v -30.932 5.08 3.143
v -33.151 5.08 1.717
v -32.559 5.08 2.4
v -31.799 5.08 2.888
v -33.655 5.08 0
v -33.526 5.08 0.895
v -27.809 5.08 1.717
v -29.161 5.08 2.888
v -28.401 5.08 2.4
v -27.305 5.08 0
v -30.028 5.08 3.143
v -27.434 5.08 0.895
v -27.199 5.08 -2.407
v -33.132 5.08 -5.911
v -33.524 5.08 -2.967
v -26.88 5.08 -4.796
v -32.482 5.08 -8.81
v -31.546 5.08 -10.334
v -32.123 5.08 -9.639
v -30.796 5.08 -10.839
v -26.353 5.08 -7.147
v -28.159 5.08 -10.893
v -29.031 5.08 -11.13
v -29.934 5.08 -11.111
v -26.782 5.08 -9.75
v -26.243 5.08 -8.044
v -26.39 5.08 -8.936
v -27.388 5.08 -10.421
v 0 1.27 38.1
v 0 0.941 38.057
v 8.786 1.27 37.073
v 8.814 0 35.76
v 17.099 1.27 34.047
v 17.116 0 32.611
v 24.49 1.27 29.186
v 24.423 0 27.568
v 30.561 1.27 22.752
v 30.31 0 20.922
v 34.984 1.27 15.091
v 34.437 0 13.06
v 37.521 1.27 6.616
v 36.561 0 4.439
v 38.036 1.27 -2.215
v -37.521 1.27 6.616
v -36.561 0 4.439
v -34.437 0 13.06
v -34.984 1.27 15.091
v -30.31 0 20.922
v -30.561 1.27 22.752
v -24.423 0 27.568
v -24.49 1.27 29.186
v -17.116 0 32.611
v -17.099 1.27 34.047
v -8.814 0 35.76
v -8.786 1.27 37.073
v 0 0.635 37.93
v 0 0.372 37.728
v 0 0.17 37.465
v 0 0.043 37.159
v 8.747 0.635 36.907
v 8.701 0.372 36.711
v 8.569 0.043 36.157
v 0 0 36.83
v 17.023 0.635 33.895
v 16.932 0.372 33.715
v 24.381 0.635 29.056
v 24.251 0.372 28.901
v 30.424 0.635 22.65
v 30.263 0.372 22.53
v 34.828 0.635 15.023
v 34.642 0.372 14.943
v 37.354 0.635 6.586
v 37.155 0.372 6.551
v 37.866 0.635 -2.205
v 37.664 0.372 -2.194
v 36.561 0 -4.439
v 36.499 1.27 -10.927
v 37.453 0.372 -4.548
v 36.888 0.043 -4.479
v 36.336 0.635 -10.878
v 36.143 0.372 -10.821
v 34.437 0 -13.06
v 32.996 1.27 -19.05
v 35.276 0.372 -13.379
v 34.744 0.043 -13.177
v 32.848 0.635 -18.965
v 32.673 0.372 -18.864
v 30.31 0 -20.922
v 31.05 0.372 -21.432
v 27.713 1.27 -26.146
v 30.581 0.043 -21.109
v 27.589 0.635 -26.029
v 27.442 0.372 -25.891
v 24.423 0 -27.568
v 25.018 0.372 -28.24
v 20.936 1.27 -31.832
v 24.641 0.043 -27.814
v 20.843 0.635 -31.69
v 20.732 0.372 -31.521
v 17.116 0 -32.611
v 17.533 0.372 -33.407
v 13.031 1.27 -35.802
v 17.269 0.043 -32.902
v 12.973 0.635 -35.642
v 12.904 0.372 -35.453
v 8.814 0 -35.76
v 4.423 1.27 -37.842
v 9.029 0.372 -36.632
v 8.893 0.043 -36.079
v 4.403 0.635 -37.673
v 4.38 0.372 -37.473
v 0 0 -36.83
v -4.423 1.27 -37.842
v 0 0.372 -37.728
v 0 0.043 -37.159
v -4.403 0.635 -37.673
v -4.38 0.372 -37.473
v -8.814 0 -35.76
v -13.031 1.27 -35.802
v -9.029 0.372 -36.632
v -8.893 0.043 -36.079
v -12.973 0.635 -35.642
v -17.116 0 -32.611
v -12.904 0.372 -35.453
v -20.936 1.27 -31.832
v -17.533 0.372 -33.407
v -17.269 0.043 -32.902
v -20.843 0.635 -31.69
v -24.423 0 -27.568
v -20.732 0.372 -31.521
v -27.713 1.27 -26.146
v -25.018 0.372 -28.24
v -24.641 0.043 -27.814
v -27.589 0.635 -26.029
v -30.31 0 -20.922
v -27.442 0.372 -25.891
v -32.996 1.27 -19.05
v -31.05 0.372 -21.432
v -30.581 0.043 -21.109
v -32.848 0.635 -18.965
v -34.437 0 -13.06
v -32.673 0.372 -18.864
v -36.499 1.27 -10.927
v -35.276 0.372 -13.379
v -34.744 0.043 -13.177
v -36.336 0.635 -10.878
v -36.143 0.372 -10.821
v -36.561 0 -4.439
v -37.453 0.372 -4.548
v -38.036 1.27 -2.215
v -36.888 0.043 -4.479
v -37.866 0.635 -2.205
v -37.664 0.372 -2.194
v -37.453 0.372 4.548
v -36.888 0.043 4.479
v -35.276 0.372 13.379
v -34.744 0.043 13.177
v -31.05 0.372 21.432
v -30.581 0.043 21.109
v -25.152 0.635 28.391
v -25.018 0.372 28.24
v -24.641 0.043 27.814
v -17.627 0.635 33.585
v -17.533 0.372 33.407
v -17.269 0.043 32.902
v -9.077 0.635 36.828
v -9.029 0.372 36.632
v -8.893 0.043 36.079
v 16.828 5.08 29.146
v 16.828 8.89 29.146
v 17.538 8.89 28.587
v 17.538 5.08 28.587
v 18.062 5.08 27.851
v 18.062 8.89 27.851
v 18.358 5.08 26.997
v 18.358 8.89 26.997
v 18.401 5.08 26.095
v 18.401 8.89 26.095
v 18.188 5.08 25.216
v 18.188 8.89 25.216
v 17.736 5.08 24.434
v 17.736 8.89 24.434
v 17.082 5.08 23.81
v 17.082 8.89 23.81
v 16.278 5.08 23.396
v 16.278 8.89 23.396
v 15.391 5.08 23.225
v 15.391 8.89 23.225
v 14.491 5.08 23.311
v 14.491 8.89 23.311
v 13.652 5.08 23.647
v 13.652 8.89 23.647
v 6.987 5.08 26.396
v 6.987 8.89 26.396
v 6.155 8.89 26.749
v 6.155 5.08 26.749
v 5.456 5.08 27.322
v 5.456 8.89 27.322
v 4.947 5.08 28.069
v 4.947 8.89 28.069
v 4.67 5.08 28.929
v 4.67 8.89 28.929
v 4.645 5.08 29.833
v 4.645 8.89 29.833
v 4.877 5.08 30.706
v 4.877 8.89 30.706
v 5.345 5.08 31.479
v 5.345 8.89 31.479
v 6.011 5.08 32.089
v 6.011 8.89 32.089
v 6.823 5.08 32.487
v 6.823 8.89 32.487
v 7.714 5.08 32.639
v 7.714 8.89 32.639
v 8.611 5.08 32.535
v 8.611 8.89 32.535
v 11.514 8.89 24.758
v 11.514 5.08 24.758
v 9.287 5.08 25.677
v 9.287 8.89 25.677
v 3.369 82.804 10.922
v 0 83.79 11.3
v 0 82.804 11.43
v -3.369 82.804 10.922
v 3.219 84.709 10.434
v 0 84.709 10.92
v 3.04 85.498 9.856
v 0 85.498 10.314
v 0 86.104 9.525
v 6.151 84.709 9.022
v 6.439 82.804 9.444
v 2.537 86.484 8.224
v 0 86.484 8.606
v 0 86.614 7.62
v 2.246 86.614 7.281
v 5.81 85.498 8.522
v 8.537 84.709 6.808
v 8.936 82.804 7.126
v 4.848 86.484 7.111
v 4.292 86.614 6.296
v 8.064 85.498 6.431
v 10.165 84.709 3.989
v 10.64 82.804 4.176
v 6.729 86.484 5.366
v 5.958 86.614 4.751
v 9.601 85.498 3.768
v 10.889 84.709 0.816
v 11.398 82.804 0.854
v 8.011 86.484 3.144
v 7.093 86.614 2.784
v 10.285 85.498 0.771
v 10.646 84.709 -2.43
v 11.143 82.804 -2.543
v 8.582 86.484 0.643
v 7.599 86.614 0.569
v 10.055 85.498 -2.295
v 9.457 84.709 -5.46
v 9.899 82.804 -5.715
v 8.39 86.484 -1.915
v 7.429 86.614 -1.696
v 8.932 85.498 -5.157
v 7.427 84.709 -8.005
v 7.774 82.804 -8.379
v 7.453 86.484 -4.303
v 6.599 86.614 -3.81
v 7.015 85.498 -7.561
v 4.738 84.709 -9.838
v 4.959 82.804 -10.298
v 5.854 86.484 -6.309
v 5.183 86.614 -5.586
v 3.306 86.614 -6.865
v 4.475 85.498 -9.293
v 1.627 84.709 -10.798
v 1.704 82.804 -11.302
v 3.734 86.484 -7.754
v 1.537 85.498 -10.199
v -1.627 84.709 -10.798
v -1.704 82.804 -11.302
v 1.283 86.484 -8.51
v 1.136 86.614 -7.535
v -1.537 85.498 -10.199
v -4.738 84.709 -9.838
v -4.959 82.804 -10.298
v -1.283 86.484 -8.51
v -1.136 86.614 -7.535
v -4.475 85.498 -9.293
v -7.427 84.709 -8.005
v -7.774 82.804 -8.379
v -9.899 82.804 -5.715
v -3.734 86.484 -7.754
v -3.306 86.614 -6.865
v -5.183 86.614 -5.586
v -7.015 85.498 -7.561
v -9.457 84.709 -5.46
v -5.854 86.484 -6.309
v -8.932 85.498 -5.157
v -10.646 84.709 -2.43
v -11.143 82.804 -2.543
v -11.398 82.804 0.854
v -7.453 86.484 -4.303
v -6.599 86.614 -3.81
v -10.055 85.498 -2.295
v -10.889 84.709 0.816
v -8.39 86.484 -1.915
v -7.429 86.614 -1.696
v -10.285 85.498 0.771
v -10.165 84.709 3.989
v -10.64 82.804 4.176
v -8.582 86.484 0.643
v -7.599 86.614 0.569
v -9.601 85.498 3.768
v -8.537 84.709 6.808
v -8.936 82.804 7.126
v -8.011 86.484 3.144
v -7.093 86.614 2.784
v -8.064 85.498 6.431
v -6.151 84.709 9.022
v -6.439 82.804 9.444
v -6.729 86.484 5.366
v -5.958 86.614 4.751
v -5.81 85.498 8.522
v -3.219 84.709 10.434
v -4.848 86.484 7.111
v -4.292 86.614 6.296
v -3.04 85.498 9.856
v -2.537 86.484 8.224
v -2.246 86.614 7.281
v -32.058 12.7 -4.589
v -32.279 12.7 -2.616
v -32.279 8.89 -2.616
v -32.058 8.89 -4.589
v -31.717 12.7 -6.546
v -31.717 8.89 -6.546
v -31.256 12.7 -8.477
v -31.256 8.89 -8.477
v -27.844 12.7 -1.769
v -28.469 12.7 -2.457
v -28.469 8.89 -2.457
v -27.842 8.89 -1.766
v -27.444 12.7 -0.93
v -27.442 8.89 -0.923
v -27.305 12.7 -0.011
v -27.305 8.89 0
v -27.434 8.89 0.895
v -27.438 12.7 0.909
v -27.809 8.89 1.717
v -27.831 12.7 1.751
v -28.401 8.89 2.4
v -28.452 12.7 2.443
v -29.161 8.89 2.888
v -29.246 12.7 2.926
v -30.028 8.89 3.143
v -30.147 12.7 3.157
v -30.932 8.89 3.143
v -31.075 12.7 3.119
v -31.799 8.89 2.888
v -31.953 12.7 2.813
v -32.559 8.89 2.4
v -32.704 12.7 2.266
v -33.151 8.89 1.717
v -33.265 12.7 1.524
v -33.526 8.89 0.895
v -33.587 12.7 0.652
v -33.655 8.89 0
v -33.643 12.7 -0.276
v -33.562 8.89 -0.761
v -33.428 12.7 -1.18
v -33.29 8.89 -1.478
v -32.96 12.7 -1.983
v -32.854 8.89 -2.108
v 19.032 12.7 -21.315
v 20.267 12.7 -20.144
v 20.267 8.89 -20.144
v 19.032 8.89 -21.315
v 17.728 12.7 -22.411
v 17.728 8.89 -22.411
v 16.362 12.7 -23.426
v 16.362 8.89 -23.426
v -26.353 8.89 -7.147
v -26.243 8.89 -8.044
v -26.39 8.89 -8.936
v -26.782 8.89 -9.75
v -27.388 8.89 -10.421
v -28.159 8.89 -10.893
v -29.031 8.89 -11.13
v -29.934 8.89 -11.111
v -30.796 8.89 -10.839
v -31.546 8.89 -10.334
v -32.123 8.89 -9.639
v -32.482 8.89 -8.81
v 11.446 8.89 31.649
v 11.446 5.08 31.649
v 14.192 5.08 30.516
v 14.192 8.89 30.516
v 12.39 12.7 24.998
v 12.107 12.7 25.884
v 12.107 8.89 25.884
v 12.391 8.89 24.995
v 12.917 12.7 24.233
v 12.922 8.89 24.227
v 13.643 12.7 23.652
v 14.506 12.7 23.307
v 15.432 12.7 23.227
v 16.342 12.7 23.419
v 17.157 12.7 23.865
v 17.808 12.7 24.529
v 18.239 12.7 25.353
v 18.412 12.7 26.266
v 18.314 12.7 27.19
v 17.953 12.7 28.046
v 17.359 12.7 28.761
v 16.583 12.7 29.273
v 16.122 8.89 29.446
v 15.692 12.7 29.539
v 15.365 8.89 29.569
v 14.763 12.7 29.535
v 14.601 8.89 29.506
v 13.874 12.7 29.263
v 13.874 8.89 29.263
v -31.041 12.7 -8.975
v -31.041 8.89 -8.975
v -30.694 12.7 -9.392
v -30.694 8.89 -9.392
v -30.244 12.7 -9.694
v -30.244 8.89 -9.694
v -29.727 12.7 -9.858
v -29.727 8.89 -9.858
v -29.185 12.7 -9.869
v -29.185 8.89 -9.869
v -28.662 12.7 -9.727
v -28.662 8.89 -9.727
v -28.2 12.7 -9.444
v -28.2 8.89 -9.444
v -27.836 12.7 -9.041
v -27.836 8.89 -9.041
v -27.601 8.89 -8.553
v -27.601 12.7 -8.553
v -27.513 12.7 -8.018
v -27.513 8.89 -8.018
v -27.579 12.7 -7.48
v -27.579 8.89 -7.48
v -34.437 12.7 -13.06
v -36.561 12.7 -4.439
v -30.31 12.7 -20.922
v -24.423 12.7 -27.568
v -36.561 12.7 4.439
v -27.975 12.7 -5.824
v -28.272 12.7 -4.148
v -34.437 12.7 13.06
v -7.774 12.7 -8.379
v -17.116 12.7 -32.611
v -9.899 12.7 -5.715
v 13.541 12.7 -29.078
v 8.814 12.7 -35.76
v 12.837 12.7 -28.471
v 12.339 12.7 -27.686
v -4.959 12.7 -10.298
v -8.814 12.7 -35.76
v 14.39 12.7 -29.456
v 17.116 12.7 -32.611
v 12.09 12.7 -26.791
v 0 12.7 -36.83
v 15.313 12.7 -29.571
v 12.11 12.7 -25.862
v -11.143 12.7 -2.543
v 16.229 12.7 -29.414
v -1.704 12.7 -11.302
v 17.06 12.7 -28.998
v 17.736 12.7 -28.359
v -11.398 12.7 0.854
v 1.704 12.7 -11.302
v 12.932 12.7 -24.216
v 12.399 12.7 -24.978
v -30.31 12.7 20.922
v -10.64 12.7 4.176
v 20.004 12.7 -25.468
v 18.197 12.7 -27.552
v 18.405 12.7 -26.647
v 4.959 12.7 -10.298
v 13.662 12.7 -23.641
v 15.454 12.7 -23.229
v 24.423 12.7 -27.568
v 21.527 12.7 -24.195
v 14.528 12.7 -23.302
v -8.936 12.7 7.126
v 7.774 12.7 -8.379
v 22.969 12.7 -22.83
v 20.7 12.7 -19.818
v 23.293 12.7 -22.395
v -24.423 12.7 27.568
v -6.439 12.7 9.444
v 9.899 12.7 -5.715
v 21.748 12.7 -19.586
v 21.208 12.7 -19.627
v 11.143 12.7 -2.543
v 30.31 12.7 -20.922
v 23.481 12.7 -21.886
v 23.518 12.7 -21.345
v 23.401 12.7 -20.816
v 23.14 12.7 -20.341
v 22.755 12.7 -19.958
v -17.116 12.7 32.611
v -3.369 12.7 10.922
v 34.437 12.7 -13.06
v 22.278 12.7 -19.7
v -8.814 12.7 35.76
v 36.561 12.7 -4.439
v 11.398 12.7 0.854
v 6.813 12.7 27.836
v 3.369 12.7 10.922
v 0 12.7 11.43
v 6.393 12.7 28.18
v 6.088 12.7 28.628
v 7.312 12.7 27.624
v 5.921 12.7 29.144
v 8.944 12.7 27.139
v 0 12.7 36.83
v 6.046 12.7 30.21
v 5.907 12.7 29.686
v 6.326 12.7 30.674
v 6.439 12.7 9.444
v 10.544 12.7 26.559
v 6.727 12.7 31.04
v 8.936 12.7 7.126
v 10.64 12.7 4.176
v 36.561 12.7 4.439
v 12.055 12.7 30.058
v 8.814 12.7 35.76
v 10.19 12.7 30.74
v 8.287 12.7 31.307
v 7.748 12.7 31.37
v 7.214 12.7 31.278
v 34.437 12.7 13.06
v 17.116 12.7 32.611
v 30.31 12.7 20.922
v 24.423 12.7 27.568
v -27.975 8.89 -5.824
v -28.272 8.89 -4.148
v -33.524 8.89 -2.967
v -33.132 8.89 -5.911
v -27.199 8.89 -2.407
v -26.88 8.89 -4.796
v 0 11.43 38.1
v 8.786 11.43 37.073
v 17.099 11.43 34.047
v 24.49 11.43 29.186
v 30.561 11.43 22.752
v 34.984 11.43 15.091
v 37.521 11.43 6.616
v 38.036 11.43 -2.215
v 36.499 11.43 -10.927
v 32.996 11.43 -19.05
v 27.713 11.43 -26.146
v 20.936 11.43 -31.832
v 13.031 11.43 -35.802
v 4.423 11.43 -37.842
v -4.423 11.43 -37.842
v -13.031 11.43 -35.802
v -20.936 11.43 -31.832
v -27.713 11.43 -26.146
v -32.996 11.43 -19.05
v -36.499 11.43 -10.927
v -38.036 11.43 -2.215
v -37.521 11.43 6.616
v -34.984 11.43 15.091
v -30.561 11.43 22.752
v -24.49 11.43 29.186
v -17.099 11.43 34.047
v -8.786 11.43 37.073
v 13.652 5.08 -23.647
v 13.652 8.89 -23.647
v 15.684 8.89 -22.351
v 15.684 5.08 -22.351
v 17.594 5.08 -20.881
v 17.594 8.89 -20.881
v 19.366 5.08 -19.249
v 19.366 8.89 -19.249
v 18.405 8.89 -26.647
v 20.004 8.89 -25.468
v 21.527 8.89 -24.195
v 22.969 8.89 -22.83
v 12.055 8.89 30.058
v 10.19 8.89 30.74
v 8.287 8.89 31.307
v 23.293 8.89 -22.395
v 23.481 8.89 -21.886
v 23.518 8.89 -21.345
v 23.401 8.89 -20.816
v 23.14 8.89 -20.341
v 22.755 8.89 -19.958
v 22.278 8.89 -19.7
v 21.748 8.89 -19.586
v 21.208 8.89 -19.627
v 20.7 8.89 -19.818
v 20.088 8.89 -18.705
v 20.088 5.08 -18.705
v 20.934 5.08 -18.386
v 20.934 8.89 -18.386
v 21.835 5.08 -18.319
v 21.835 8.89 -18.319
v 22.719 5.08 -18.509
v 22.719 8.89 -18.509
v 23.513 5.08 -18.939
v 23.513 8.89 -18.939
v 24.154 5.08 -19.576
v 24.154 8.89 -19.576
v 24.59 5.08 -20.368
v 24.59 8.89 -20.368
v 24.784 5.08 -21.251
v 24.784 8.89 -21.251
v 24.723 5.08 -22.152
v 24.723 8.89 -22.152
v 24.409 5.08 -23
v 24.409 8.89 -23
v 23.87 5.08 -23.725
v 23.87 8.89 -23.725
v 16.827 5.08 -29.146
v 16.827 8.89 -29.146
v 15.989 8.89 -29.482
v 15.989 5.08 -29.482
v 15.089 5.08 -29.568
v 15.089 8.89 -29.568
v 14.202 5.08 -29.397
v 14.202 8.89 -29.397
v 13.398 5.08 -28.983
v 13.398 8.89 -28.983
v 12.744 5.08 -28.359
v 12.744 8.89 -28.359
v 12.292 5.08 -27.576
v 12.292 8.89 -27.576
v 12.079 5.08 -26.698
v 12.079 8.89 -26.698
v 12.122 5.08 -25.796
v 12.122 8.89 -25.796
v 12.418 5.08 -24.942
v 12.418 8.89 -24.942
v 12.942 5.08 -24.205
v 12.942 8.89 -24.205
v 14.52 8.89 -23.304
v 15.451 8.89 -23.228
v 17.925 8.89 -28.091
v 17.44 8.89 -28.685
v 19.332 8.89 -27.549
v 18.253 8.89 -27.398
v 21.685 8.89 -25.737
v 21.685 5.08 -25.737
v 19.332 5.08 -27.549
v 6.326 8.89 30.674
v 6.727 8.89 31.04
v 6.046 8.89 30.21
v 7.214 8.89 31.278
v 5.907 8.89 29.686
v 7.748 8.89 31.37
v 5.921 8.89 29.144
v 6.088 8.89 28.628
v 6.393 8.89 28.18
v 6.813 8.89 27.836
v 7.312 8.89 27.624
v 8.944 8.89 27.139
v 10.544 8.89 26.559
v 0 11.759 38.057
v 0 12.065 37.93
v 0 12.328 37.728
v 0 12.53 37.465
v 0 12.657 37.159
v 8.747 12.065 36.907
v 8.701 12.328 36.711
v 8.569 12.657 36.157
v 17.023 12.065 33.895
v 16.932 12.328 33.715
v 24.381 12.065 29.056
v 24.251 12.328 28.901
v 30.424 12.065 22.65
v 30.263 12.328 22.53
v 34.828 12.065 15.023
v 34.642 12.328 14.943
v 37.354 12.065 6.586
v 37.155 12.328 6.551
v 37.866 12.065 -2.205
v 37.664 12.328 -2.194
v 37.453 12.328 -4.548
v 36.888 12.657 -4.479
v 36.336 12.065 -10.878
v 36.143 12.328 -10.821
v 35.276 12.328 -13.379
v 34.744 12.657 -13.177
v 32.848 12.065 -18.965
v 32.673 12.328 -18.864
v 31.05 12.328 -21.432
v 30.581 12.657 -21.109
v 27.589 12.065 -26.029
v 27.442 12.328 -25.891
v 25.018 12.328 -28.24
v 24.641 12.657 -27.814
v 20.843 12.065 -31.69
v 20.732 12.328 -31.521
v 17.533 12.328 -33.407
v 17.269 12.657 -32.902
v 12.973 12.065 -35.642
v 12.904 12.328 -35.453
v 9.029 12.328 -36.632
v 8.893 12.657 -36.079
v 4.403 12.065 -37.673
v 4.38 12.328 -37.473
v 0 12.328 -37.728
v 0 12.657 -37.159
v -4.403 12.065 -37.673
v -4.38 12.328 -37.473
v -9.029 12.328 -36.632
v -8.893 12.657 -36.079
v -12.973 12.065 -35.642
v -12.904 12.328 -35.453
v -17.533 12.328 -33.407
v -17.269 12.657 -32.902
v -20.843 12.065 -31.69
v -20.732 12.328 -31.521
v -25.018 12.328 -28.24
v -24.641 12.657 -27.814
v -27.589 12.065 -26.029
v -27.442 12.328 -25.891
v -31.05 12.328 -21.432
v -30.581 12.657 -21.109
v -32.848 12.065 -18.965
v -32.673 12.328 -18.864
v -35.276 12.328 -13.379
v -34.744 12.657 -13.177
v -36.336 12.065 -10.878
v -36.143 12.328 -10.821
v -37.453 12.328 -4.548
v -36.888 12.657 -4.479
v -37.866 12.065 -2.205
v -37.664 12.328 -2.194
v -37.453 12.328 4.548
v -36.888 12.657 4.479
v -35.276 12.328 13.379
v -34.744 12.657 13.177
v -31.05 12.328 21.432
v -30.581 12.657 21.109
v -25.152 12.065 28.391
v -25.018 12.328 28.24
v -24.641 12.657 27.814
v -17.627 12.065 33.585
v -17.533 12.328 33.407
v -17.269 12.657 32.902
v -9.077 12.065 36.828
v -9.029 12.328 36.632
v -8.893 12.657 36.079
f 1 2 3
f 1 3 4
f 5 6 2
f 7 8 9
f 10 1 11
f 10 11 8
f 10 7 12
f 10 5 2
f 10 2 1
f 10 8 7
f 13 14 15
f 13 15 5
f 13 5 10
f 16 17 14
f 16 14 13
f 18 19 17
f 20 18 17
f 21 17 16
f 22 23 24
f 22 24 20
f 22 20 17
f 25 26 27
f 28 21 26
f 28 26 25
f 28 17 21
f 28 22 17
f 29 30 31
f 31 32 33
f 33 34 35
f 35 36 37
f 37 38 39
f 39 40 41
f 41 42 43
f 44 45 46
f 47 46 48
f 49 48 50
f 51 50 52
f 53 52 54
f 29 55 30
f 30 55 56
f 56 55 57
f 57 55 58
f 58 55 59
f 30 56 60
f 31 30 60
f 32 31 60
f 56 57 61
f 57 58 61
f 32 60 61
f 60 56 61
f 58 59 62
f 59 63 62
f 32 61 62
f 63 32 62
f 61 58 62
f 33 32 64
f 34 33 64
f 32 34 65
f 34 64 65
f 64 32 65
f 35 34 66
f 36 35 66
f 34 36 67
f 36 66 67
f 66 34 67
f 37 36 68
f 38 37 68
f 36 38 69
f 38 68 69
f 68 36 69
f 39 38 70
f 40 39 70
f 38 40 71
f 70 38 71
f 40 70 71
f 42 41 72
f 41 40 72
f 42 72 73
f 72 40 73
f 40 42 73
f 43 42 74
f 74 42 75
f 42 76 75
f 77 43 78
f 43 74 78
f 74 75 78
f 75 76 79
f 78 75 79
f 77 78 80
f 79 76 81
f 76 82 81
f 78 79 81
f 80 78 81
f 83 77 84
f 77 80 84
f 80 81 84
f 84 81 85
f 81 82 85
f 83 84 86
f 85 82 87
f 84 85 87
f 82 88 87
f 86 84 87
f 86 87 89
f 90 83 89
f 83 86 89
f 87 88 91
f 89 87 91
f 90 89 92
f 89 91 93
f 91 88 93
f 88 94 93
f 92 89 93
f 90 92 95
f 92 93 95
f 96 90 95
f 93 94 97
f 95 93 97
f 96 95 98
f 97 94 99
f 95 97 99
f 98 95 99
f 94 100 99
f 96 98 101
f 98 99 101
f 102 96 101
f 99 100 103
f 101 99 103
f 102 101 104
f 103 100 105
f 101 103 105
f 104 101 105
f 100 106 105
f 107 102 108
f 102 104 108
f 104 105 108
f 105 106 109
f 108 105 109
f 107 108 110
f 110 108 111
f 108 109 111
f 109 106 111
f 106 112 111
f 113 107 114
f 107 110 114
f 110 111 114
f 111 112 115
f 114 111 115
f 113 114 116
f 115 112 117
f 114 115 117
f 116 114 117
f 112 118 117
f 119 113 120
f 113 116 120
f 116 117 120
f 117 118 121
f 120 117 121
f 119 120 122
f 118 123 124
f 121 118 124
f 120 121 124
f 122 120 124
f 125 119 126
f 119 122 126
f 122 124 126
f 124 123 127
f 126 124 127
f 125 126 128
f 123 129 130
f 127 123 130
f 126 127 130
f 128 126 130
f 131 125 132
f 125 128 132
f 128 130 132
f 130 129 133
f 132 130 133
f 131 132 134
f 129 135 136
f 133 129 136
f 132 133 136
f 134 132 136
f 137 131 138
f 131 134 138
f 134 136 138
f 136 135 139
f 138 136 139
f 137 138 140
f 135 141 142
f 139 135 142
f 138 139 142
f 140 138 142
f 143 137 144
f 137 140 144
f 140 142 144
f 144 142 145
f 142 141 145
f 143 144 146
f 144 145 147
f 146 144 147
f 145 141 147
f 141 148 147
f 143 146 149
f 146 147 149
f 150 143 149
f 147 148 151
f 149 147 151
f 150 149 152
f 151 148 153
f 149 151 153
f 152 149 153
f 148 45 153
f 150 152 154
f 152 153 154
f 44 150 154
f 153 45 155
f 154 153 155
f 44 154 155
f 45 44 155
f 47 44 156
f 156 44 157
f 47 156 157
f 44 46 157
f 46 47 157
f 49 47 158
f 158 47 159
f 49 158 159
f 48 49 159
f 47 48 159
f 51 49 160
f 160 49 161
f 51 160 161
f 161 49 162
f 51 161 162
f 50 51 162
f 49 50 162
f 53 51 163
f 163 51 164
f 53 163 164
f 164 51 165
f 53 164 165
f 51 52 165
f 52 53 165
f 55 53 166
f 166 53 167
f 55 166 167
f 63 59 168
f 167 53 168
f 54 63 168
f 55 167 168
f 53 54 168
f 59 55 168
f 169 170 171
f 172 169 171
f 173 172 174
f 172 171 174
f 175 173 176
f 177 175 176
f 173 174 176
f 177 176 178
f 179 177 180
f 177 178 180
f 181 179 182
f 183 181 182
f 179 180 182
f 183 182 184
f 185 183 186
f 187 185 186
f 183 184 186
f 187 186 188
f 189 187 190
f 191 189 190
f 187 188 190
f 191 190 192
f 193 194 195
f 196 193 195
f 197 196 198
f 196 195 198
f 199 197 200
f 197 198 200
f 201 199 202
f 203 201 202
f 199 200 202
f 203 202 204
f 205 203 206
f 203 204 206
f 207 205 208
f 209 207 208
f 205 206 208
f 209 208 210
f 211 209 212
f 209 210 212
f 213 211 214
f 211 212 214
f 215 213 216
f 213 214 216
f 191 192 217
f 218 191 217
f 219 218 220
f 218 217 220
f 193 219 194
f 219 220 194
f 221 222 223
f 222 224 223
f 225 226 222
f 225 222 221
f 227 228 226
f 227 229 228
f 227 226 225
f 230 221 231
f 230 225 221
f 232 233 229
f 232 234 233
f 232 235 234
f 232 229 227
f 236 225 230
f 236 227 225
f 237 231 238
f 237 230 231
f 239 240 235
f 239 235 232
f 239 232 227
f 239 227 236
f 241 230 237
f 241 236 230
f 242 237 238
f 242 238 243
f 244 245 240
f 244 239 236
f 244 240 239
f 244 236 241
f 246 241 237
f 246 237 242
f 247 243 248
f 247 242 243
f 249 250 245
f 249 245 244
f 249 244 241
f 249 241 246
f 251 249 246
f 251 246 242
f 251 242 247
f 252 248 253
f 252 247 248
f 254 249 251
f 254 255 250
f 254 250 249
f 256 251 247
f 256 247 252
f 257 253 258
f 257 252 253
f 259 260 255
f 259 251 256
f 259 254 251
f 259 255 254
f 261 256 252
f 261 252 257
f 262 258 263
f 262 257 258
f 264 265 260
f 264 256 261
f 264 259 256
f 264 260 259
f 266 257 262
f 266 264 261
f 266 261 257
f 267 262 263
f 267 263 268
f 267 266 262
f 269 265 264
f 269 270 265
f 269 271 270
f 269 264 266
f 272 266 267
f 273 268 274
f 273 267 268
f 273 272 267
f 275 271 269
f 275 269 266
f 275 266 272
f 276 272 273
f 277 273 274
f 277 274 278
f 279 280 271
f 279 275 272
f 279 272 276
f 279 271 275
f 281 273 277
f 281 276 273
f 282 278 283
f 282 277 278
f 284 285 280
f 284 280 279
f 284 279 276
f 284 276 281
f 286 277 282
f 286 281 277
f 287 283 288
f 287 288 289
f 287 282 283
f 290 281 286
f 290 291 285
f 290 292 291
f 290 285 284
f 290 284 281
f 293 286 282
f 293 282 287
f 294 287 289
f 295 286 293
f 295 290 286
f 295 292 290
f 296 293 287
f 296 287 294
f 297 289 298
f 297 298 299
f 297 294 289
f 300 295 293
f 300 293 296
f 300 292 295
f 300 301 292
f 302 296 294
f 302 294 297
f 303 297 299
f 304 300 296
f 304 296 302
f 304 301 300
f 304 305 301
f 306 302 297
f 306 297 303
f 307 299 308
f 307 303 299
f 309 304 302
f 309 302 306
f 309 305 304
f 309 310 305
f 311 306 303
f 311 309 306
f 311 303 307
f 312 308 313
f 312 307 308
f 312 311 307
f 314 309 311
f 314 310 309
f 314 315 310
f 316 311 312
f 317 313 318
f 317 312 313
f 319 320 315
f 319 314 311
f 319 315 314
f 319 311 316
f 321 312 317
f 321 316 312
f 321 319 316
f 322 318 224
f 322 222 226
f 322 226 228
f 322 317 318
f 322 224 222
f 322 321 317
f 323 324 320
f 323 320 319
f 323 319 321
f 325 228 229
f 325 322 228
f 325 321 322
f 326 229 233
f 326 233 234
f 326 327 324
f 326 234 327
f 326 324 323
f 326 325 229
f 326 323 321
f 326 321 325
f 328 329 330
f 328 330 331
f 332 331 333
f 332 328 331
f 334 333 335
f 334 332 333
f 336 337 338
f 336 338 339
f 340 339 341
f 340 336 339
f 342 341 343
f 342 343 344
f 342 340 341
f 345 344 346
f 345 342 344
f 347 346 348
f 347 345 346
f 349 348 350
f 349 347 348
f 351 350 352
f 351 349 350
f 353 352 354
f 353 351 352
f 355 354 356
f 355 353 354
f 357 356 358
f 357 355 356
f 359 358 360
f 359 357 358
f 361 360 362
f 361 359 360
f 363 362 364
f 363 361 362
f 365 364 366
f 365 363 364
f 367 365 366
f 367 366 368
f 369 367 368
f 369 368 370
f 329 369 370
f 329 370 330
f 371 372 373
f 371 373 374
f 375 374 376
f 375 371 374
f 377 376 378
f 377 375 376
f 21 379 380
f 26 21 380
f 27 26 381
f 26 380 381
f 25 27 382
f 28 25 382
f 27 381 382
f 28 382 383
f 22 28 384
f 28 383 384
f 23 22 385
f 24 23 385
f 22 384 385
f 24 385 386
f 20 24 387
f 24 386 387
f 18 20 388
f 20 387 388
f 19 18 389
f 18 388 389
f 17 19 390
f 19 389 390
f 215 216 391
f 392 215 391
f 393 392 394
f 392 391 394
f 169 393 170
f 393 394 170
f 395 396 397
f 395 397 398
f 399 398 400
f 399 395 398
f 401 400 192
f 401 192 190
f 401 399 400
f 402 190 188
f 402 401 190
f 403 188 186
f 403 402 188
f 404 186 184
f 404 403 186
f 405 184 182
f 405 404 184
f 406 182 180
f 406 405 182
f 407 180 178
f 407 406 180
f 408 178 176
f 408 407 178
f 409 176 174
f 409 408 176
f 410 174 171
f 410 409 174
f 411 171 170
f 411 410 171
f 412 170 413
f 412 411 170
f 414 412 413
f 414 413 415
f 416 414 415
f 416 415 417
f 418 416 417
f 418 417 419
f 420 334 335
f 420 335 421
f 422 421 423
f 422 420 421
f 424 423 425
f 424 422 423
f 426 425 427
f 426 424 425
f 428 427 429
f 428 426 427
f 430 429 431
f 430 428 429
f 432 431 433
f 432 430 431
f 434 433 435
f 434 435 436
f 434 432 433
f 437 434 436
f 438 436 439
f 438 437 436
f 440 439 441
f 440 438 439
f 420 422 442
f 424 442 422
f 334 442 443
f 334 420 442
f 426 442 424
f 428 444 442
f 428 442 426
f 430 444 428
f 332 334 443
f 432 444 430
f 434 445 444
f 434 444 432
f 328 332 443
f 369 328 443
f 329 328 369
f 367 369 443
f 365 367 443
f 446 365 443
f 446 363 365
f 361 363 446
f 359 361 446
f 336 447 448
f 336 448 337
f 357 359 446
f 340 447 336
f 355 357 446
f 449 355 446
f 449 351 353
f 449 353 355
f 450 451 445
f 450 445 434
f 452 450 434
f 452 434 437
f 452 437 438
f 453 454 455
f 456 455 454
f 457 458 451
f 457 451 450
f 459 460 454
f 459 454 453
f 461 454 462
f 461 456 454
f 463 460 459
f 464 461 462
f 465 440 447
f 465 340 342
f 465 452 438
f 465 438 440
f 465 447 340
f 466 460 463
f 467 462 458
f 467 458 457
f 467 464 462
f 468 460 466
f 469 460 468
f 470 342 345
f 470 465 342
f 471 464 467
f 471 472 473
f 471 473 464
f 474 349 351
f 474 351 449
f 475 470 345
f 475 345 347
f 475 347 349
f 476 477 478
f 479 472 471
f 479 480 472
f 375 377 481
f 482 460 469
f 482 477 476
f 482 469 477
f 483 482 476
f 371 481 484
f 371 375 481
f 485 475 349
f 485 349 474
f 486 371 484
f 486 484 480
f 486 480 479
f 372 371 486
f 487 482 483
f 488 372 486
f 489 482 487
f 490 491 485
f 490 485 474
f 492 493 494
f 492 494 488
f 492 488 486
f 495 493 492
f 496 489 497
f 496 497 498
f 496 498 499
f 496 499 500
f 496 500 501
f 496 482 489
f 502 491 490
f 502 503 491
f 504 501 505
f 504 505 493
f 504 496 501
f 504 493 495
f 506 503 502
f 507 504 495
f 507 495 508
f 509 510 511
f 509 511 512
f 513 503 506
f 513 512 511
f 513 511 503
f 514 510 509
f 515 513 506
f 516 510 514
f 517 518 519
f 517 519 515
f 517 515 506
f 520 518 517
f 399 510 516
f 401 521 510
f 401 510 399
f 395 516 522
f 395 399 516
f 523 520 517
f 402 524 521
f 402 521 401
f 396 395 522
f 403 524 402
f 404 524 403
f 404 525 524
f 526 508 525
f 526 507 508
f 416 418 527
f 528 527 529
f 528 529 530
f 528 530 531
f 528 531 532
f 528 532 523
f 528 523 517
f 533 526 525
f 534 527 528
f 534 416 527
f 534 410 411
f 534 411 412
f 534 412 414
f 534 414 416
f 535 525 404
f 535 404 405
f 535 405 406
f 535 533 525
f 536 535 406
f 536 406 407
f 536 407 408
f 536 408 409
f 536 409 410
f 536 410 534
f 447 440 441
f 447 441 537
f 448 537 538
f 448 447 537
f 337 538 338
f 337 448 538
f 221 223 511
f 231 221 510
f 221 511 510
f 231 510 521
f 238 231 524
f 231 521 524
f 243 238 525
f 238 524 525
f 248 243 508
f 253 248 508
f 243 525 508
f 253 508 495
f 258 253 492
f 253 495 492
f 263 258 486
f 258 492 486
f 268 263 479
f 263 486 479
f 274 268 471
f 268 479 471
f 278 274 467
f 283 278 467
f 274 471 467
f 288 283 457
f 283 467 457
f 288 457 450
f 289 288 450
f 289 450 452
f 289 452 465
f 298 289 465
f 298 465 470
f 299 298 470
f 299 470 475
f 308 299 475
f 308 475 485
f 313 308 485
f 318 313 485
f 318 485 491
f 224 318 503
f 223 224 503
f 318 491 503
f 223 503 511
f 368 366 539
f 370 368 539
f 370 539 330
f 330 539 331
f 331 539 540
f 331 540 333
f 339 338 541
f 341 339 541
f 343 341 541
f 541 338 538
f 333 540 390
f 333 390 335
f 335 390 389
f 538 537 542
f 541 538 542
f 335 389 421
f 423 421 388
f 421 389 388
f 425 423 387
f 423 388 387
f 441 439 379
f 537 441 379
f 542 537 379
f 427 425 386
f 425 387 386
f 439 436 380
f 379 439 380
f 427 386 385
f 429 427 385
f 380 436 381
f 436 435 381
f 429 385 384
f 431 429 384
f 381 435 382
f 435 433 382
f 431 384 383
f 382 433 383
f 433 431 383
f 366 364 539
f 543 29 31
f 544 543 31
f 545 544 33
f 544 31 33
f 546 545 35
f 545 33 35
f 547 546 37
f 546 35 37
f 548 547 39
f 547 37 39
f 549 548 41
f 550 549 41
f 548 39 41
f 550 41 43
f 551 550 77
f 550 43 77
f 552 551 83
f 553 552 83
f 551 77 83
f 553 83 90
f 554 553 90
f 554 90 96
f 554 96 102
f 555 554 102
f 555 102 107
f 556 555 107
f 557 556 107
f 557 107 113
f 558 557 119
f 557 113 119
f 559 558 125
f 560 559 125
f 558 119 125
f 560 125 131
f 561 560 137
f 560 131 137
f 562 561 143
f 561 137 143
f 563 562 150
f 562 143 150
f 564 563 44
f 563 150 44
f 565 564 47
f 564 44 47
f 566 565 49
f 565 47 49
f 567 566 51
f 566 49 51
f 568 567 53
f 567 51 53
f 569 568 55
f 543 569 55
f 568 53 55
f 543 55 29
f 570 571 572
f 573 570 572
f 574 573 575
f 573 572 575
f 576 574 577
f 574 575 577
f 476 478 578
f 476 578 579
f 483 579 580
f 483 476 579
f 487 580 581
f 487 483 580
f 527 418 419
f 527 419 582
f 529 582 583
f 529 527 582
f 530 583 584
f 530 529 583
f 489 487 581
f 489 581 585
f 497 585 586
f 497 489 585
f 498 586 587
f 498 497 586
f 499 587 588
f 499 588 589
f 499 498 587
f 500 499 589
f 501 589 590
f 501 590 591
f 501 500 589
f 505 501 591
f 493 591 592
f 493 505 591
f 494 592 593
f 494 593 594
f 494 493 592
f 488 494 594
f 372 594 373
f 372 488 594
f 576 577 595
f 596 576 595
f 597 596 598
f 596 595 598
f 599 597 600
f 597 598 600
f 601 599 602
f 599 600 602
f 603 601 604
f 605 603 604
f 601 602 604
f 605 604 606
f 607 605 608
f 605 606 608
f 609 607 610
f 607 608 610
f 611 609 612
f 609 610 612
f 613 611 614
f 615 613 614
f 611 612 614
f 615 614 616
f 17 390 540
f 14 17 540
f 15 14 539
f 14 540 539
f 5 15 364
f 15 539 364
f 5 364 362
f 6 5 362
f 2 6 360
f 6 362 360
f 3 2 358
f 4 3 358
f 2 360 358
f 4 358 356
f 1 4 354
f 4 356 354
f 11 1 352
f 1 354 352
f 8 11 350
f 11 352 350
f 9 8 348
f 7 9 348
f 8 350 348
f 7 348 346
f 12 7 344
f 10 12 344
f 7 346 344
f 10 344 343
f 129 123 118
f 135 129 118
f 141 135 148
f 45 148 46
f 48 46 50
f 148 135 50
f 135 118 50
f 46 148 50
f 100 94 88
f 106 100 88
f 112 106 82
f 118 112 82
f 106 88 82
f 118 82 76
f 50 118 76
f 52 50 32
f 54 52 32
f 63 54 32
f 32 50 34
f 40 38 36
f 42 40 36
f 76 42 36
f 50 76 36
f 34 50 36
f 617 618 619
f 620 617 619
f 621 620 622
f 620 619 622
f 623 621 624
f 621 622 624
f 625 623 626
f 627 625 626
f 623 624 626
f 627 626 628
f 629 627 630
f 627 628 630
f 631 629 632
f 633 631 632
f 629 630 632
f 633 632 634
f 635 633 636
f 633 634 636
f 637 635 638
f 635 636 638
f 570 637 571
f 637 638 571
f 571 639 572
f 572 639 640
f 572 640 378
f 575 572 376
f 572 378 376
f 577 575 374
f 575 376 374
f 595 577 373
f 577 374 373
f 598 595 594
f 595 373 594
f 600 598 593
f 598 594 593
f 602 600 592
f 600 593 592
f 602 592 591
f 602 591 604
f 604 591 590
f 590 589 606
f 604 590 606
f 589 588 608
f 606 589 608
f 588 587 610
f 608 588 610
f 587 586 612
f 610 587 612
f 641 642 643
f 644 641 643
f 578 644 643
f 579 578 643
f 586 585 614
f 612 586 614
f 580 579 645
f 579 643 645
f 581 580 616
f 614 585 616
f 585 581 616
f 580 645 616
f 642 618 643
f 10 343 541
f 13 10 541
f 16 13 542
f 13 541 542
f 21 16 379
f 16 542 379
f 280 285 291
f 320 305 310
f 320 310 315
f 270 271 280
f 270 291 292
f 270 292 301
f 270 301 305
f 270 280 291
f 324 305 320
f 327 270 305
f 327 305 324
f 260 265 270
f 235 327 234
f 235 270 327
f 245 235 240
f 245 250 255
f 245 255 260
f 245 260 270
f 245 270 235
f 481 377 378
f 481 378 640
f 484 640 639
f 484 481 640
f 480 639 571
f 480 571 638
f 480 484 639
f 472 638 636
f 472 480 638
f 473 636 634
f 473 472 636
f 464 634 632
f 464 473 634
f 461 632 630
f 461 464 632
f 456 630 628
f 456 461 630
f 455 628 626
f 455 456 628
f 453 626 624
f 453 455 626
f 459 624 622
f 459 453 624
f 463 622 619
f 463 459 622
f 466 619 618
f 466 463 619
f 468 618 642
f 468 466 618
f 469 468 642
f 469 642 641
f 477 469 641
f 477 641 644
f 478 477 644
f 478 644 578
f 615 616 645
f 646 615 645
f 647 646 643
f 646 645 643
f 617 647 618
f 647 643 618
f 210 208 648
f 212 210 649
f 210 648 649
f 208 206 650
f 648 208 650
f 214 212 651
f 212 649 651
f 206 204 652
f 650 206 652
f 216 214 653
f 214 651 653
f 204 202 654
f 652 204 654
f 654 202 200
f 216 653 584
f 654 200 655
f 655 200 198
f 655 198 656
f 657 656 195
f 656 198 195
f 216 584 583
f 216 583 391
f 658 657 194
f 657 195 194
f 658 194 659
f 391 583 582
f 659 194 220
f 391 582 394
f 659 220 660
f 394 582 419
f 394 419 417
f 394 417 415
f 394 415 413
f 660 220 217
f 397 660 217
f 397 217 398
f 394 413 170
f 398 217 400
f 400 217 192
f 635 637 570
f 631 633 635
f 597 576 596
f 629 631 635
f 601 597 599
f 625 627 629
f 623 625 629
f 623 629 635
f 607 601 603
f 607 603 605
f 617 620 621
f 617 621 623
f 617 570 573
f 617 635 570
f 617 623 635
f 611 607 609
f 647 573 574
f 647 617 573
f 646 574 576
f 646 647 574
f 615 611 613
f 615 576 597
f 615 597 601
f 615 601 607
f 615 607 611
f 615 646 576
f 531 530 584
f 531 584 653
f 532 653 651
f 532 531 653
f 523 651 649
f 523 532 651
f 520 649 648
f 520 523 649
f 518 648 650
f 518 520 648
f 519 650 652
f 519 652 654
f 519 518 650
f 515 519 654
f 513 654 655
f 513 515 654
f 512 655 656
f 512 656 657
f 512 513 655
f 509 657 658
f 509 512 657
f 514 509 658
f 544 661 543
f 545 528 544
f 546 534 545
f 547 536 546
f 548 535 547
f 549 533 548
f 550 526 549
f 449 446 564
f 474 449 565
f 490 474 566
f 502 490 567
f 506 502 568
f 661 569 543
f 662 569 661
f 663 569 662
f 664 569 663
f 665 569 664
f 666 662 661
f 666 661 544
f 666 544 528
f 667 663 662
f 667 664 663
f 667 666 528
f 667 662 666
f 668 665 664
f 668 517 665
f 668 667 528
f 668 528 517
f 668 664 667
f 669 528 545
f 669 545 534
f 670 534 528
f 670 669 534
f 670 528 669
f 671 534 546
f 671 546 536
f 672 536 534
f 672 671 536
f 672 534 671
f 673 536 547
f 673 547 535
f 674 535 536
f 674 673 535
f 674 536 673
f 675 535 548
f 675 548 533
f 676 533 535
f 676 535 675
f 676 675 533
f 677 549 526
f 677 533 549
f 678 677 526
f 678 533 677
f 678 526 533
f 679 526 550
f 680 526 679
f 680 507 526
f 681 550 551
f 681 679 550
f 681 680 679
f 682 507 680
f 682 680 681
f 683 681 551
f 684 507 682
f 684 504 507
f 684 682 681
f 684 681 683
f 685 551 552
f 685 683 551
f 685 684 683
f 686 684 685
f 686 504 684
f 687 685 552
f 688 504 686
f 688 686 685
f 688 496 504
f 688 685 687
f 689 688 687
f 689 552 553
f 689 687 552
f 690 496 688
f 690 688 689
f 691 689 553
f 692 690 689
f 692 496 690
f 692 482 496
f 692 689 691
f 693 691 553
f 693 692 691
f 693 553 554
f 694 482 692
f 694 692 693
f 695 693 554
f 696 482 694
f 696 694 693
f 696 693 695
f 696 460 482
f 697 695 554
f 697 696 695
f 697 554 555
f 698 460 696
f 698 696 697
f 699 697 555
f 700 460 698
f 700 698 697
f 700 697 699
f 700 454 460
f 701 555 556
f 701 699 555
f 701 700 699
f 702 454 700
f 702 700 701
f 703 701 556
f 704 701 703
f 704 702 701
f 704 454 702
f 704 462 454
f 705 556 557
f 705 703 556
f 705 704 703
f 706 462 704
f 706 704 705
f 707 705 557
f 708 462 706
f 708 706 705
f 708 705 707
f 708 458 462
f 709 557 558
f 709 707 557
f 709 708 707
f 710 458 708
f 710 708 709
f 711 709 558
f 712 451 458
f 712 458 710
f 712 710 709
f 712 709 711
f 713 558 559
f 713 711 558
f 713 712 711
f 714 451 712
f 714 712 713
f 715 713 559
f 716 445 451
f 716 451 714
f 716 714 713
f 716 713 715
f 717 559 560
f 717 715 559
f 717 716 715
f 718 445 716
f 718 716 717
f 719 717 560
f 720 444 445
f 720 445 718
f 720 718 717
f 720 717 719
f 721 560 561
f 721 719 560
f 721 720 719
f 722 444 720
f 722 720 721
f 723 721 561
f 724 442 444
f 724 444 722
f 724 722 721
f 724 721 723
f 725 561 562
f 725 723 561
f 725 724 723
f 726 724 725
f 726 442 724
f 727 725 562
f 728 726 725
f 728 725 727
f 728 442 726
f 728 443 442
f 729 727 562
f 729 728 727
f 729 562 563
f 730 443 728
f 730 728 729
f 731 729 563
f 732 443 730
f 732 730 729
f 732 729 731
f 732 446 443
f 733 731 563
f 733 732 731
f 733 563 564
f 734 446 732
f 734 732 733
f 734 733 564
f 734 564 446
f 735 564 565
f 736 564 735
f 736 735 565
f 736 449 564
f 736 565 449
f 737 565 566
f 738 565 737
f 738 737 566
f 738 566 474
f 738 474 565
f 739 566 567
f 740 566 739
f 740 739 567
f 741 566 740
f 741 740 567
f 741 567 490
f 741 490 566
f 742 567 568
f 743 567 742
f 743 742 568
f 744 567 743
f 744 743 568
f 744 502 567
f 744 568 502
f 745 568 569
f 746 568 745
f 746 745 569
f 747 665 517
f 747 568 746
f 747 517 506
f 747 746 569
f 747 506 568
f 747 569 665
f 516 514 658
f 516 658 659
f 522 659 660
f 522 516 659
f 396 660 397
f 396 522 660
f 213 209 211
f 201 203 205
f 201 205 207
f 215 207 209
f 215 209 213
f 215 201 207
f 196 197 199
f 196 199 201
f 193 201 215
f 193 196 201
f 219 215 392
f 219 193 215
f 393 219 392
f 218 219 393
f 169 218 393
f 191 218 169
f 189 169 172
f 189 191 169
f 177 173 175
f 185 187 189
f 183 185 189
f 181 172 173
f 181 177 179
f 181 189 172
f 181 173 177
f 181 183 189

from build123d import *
from build123d.topology import SkipClean

# Parameters (mm, degrees)
SKETCH1_R           = 38.1
BOSS_EXTRUDE1_DEPTH = 12.7
SKETCH2_R           = 11.43
BOSS_EXTRUDE2_DEPTH = 73.914
FILLET1_R           = 1.27
FILLET2_R           = 1.27
FILLET3_R           = 3.81
CUT_EXTRUDE2_DEPTH  = 3.81
CUT_EXTRUDE3_DEPTH  = 3.81


with BuildPart() as part:
    # Sketch1 → Boss-Extrude1 (new body)
    with BuildSketch(Plane(origin=(0, 0, 0), x_dir=(1, 0, 0), z_dir=(0, 1, 0))):
        with Locations(Location((0, 0, 0), (0, 0, 270))):
            Circle(SKETCH1_R)
    extrude(amount=BOSS_EXTRUDE1_DEPTH)

    # Sketch2 → Boss-Extrude2 (add)
    with BuildSketch(Plane(origin=(0, 12.7, 0), x_dir=(1, 0, 0), z_dir=(0, 1, 0))):
        with Locations(Location((0, 0, 0), (0, 0, 270))):
            Circle(SKETCH2_R)
    extrude(amount=BOSS_EXTRUDE2_DEPTH)

    # Fillet1
    fillet1_edges = [part.edges().sort_by_distance(p)[0] for p in [
        (0, 12.7, -38.1),
    ]]
    fillet(fillet1_edges, radius=FILLET1_R)

    # Fillet2
    fillet2_edges = [part.edges().sort_by_distance(p)[0] for p in [
        (0, 0, -38.1),
    ]]
    fillet(fillet2_edges, radius=FILLET2_R)

    # Fillet3
    fillet3_edges = [part.edges().sort_by_distance(p)[0] for p in [
        (0, 86.614, -11.43),
    ]]
    fillet(fillet3_edges, radius=FILLET3_R)

    # Sketch4 → Cut-Extrude2 (cut)
    with BuildSketch(Plane(origin=(0, 12.7, 0), x_dir=(-1, 0, 0), z_dir=(0, -1, 0))):
        with BuildLine():
            ThreePointArc((-12.106701586, -25.883554657), (-18.053418689, -24.924958375), (-13.874033018, -29.26259443))
            ThreePointArc((-13.874033018, -29.26259443), (-11.127331545, -30.41333125), (-8.286537239, -31.306892621))
            ThreePointArc((-8.286537239, -31.306892621), (-5.957511953, -29.952754069), (-7.311650505, -27.623728783))
            ThreePointArc((-7.311650505, -27.623728783), (-9.748084477, -26.860853933), (-12.106701586, -25.883554657))
        make_face()
        with BuildLine():
            ThreePointArc((28.469166667, 2.457066199), (30.612356486, -3.172240023), (32.279166667, 2.616032168))
            ThreePointArc((32.279166667, 2.616032168), (31.902383248, 5.570113831), (31.255832943, 8.477094553))
            ThreePointArc((31.255832943, 8.477094553), (28.918601914, 9.81702034), (27.578676126, 7.479789311))
            ThreePointArc((27.578676126, 7.479789311), (28.136224112, 4.988338171), (28.469166667, 2.457066199))
        make_face()
        with BuildLine():
            ThreePointArc((-16.36246508, 23.426488458), (-12.558937796, 28.097198398), (-18.405133648, 26.646562262))
            ThreePointArc((-18.405133648, 26.646562262), (-20.775051704, 24.843217419), (-22.969295704, 22.829798069))
            ThreePointArc((-22.969295704, 22.829798069), (-22.961089961, 20.135733729), (-20.267025621, 20.143939472))
            ThreePointArc((-20.267025621, 20.143939472), (-18.388139635, 21.872515762), (-16.36246508, 23.426488458))
        make_face()
    extrude(amount=CUT_EXTRUDE2_DEPTH, mode=Mode.SUBTRACT)

    # Sketch5 → Cut-Extrude3 (cut)
    with SkipClean():  # the faces are left unmerged after this step: merging them gives an invalid solid
        with BuildSketch(Plane(origin=(0, 8.89, 0), x_dir=(1, 0, 0), z_dir=(0, 1, 0))):
            with BuildLine():
                ThreePointArc((16.8275, -29.146084964), (17.989630657, -24.808954307), (13.6525, -23.64682365))
                ThreePointArc((13.6525, -23.64682365), (10.410740895, -25.242414683), (6.98668826, -26.396007504))
                ThreePointArc((6.98668826, -26.396007504), (4.729790674, -30.277716314), (8.611499483, -32.5346139))
                ThreePointArc((8.611499483, -32.5346139), (12.831843428, -31.112743679), (16.8275, -29.146084964))
            make_face()
            with BuildLine():
                ThreePointArc((-32.481551882, 8.809529633), (-33.360348122, 4.443669453), (-33.655, 0))
                ThreePointArc((-33.655, 0), (-30.48, -3.175), (-27.305, 0))
                ThreePointArc((-27.305, 0), (-27.065942816, 3.605241255), (-26.352957187, 7.147354231))
                ThreePointArc((-26.352957187, 7.147354231), (-28.586166833, 11.042739279), (-32.481551882, 8.809529633))
            make_face()
            with BuildLine():
                ThreePointArc((23.870052398, 23.725084267), (20.528504693, 26.669074226), (16.8275, 29.146084964))
                ThreePointArc((16.8275, 29.146084964), (12.490369343, 27.983954307), (13.6525, 23.64682365))
                ThreePointArc((13.6525, 23.64682365), (16.655201921, 21.637173428), (19.366268927, 19.248653274))
                ThreePointArc((19.366268927, 19.248653274), (23.85637616, 19.234977035), (23.870052398, 23.725084267))
            make_face()
        extrude(amount=-CUT_EXTRUDE3_DEPTH, mode=Mode.SUBTRACT)


solid = part.part
